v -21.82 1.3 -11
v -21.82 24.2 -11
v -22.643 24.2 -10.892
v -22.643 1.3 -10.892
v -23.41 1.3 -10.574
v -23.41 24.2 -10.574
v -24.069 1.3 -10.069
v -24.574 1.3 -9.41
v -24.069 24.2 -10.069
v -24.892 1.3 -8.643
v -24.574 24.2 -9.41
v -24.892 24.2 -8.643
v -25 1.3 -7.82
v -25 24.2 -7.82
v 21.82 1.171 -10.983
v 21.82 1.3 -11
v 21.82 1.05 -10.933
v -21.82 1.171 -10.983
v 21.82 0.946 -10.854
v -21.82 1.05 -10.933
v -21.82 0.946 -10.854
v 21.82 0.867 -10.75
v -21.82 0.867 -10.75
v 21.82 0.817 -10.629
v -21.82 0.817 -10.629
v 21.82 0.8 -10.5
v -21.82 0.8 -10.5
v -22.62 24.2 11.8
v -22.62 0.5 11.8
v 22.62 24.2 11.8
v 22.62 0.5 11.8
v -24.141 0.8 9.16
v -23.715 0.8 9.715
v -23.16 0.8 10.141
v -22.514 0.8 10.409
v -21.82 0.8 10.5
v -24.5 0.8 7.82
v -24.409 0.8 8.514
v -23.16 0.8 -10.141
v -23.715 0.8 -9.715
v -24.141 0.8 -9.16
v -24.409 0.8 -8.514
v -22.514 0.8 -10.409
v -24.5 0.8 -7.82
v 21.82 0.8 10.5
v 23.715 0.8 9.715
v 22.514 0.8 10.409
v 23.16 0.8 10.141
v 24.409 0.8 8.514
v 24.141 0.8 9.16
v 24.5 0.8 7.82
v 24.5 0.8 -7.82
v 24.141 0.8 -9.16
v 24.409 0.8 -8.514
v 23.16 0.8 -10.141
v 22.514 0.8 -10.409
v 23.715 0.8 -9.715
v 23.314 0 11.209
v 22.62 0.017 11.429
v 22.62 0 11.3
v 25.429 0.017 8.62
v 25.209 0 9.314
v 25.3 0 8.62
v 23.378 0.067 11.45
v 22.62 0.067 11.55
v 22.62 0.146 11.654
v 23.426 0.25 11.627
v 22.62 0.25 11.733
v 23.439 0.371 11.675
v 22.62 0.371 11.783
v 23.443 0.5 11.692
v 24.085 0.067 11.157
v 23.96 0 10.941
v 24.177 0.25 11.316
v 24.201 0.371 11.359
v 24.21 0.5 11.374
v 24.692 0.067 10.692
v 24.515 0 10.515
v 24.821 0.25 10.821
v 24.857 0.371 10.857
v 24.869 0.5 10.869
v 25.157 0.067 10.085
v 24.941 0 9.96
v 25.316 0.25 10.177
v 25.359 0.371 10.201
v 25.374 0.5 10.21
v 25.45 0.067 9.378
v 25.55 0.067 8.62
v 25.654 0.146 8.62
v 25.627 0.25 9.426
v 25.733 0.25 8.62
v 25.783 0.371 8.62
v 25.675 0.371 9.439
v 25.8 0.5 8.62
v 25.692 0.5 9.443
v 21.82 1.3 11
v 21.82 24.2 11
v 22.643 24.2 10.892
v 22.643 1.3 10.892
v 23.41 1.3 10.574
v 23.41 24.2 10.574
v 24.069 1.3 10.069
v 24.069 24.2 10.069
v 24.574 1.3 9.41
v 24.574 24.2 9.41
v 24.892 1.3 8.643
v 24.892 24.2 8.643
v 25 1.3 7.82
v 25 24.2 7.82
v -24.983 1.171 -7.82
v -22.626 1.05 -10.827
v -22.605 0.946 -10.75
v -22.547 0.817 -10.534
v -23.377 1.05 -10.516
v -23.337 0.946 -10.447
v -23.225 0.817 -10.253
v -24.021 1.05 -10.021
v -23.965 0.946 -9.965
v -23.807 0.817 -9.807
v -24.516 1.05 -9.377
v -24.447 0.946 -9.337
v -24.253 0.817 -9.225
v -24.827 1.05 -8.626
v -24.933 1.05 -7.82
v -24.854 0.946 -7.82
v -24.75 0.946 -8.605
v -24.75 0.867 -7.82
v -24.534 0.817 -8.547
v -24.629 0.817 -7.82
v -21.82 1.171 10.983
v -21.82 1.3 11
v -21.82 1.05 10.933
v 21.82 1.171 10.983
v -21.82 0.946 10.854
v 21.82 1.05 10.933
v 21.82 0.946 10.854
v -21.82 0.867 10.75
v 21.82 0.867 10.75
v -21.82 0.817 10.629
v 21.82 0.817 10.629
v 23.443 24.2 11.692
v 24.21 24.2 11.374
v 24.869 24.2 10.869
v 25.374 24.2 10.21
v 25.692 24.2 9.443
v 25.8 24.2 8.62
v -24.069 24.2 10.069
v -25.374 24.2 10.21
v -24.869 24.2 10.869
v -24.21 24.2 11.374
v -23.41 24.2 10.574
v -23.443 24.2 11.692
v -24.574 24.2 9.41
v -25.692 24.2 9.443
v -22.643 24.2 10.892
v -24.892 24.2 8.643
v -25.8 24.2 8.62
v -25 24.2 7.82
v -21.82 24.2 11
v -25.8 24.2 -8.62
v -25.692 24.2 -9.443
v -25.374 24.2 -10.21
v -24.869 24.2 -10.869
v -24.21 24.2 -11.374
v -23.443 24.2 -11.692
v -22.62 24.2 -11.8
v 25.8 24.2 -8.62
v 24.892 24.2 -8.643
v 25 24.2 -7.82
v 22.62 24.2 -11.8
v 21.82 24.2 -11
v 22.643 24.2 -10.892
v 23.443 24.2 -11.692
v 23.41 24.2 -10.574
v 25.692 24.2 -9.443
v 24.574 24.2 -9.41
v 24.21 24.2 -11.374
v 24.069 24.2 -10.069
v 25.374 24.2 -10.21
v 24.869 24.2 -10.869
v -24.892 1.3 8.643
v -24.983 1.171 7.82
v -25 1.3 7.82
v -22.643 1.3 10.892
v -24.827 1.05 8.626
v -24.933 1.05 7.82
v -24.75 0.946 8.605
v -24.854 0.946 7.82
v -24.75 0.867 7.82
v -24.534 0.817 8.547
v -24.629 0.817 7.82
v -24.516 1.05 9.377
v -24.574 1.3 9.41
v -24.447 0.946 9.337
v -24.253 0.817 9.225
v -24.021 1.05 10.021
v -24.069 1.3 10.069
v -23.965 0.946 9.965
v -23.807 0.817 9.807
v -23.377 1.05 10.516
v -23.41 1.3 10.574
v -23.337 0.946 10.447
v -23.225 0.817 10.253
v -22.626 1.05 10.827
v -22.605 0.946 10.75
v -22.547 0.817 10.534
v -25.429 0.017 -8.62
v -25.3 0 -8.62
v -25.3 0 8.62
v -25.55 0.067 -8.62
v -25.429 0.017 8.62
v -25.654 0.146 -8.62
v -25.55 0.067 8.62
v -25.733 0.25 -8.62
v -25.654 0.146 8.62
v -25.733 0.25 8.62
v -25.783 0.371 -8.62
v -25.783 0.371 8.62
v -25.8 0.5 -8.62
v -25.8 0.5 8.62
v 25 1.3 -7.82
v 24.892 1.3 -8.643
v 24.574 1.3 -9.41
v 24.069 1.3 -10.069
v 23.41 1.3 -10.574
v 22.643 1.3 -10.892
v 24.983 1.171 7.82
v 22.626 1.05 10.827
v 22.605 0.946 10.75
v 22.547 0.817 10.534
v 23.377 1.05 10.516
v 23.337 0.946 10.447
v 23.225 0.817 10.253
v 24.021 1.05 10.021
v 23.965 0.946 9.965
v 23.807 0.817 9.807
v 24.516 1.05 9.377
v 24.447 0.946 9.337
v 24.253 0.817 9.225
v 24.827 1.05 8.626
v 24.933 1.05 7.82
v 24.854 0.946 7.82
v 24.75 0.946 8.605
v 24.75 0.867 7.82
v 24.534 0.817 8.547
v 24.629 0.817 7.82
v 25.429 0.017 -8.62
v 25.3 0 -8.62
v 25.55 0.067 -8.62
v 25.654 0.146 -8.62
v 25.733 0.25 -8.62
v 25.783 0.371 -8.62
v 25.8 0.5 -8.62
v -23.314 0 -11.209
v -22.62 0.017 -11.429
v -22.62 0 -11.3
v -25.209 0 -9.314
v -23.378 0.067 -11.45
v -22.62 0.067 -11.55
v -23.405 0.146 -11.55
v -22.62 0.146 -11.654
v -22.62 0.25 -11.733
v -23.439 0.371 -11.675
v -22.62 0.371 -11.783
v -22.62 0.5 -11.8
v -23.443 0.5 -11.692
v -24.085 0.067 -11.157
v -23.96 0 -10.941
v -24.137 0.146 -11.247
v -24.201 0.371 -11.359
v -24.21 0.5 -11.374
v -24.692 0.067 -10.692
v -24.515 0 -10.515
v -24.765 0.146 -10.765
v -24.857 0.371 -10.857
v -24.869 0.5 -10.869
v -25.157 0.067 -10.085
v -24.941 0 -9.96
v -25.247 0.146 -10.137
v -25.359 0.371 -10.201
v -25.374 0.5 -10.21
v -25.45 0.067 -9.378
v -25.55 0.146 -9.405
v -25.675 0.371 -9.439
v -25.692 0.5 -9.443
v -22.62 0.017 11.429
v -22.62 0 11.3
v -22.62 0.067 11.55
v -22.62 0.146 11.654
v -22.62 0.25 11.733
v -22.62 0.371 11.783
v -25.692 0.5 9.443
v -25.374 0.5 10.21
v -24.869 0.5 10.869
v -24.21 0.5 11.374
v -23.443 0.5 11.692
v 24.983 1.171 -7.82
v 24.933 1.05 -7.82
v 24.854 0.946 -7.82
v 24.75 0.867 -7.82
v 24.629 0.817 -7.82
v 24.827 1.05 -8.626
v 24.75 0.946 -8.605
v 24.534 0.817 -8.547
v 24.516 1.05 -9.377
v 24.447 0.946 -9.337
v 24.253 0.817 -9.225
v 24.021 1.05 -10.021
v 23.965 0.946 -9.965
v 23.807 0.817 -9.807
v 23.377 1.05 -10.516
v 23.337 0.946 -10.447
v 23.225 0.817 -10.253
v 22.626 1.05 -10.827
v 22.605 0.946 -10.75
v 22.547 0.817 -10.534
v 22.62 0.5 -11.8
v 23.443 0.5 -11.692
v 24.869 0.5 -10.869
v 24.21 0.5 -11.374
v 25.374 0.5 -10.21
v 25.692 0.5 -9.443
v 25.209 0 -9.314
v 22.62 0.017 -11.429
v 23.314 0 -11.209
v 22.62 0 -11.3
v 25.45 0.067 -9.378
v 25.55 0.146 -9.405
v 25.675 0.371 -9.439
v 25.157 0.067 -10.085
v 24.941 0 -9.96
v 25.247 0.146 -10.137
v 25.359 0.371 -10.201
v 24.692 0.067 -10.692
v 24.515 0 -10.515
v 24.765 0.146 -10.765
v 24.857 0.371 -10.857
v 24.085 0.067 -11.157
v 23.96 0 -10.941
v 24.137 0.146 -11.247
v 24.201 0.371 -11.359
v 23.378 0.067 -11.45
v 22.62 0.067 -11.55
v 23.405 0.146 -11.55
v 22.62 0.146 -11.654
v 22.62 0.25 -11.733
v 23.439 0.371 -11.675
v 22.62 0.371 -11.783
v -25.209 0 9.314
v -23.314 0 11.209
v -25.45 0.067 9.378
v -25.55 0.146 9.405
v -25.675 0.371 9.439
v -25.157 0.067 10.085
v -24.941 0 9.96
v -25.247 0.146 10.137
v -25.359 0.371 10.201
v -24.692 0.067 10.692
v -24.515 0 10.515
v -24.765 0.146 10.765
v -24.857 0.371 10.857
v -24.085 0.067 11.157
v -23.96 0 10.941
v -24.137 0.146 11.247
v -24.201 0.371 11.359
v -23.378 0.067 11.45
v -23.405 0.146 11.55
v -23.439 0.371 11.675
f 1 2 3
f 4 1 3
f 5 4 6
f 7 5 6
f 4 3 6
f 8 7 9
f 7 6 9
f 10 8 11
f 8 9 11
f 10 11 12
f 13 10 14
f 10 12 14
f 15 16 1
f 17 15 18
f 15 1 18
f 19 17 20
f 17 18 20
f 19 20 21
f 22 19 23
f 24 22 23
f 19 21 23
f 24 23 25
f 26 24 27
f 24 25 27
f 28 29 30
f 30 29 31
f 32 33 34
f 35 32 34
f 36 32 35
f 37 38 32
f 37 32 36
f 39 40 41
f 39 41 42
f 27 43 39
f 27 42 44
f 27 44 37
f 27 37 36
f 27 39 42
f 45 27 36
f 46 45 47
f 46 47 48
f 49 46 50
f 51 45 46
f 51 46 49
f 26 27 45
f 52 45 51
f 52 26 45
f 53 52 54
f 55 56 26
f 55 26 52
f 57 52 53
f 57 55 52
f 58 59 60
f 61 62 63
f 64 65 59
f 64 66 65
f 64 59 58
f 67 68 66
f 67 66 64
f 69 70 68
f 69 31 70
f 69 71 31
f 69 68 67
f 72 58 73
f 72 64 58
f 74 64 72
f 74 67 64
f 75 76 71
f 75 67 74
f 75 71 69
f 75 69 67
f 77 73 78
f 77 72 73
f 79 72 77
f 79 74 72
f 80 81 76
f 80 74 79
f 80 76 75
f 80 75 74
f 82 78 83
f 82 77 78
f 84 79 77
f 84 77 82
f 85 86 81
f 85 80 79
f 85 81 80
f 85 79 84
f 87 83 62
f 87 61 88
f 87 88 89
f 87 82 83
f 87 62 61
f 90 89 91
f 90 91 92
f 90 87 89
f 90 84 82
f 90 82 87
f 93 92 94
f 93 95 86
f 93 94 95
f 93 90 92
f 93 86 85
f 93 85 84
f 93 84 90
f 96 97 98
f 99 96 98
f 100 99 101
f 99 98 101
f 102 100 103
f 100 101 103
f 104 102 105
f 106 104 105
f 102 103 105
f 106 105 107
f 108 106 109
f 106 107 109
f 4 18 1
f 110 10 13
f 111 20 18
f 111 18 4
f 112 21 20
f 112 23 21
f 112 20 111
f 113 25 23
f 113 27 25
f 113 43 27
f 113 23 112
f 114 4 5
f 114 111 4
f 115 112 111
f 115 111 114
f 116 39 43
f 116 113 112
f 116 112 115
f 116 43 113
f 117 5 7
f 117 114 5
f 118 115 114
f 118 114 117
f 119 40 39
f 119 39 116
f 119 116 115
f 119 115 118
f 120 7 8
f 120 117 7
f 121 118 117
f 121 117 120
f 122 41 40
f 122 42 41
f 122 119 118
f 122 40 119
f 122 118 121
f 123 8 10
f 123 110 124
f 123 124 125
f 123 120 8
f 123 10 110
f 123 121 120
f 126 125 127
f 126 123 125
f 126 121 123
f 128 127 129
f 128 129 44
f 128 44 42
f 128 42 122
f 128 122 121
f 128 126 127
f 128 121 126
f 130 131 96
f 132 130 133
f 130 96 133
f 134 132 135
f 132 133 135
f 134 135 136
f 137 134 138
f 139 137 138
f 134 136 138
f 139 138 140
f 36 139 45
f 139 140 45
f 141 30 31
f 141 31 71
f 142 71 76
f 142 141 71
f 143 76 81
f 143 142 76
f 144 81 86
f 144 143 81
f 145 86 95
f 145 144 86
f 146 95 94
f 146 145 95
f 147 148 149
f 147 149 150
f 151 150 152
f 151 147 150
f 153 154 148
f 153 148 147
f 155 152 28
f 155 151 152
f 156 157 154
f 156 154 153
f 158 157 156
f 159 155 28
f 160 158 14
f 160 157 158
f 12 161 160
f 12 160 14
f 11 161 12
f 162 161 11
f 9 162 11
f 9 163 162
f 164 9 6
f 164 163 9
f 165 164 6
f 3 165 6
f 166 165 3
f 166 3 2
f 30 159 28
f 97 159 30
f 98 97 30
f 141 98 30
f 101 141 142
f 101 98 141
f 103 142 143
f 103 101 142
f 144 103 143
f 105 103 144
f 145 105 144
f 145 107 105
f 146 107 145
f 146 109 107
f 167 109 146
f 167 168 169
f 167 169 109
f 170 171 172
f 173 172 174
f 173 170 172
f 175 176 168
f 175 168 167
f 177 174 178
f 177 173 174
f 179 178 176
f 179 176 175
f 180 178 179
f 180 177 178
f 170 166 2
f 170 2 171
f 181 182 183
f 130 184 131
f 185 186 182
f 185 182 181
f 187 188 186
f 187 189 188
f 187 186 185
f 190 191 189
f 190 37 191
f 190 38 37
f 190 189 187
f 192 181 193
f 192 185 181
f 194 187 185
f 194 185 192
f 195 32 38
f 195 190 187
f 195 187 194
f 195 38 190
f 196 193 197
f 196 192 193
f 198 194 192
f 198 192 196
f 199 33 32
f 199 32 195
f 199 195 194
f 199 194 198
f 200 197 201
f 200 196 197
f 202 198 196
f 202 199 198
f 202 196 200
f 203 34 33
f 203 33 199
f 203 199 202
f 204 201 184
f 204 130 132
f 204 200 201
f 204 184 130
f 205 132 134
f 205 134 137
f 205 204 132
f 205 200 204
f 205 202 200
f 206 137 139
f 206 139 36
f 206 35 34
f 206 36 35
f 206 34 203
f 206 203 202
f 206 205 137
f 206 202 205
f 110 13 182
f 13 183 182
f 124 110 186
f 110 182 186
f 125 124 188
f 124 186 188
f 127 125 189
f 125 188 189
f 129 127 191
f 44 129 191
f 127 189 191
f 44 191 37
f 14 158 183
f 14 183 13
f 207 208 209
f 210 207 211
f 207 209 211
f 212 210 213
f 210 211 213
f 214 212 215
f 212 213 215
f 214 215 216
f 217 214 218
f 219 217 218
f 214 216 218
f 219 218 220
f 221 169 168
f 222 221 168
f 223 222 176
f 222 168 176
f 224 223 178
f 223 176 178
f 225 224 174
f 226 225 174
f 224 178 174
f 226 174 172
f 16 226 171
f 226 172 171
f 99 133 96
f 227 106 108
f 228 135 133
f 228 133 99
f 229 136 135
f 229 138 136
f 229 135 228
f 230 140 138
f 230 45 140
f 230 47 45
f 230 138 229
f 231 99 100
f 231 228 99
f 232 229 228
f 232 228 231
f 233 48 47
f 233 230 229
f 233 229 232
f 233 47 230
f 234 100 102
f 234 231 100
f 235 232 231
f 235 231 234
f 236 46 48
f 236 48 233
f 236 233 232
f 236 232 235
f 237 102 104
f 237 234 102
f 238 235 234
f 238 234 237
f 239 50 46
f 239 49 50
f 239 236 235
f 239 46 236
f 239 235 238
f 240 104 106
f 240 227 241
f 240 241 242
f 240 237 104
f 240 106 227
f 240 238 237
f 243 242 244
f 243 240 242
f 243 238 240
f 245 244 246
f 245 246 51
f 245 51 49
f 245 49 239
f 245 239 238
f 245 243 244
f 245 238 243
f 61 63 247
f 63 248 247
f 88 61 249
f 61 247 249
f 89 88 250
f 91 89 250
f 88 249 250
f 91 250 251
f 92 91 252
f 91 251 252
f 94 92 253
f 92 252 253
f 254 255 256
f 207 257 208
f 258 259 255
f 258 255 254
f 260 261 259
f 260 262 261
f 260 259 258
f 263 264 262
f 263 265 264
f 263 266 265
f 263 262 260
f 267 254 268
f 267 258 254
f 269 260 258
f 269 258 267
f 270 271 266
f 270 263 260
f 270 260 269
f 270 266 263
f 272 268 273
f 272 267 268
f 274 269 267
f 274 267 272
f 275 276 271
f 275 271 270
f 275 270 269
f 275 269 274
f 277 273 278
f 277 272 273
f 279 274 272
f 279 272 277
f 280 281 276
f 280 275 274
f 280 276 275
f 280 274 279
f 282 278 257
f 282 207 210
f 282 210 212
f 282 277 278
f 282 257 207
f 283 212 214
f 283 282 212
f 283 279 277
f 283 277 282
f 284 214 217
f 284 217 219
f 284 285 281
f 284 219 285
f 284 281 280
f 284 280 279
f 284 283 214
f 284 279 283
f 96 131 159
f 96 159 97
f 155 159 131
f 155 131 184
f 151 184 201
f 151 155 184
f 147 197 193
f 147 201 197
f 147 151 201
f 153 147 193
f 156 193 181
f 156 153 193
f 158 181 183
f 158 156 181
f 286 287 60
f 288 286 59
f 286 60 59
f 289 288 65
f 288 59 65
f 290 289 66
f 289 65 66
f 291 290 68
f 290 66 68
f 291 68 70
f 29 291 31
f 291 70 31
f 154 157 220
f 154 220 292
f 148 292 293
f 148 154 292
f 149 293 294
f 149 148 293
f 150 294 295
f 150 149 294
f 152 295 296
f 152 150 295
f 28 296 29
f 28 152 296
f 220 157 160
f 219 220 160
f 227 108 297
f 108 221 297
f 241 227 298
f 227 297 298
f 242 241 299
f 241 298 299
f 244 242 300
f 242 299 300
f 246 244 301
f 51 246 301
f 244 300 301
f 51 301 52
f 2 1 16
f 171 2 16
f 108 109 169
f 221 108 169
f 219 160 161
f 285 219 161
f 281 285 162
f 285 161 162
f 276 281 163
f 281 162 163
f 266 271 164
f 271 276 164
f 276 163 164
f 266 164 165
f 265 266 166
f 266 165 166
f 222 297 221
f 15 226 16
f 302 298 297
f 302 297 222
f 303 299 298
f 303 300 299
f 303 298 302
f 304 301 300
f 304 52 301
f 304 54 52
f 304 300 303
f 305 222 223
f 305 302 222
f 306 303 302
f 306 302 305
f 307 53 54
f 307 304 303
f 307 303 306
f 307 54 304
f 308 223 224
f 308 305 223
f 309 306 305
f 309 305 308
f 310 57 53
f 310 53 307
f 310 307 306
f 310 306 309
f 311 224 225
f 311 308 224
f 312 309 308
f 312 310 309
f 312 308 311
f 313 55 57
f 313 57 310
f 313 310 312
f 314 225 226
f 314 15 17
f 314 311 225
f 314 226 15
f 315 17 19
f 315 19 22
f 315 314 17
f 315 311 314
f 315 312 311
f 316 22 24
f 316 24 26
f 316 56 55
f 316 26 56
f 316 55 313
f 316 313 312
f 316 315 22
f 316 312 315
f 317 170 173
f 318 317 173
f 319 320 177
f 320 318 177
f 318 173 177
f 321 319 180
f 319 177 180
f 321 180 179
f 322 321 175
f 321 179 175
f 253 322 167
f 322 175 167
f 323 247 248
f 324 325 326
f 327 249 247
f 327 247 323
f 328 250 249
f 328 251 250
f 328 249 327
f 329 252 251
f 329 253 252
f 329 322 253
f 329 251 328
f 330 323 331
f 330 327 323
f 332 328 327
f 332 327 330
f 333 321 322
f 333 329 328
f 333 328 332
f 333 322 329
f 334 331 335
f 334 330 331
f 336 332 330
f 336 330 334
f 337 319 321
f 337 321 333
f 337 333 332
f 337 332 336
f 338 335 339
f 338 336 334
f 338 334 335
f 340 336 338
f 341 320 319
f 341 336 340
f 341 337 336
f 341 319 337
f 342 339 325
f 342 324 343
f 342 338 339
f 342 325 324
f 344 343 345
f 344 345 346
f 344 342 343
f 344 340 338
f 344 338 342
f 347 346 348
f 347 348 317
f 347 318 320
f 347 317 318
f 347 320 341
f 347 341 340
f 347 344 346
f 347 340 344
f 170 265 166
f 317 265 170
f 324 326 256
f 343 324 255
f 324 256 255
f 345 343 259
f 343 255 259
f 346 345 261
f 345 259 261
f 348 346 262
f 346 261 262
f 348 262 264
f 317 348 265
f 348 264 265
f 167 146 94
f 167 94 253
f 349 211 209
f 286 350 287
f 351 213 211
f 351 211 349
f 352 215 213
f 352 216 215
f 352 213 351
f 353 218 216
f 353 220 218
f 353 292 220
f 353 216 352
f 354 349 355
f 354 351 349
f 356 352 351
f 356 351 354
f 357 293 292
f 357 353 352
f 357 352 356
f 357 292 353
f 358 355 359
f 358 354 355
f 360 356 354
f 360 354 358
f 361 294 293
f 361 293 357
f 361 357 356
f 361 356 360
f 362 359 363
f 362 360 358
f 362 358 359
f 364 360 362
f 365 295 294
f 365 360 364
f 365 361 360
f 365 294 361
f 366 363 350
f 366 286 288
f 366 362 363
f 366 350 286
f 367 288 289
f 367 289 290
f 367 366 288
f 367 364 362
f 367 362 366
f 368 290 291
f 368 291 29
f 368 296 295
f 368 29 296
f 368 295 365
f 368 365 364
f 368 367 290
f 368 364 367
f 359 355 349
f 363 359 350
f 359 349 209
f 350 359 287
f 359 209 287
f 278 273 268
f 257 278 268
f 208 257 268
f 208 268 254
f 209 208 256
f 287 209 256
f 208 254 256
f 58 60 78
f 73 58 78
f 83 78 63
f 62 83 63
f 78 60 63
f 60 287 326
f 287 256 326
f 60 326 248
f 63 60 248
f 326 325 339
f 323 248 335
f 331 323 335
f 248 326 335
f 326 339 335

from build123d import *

# Parameters (mm, degrees)
SKETCH4_W           = 51.6
SKETCH4_H           = 23.6
SKETCH4_W_2         = 50
SKETCH4_H_2         = 22
BOSS_EXTRUDE2_DEPTH = 24.2
SKETCH4_2_W         = 50
SKETCH4_2_H         = 22
BOSS_EXTRUDE3_DEPTH = 0.8
FILLET3_R           = 3.18
FILLET4_R           = 0.5


with BuildPart() as part:
    # Sketch4 → Boss-Extrude2 (new body)
    with BuildSketch(Plane(origin=(0, 0, 0), x_dir=(1, 0, 0), z_dir=(0, 1, 0))):
        Rectangle(SKETCH4_W, SKETCH4_H)
        Rectangle(SKETCH4_W_2, SKETCH4_H_2, mode=Mode.SUBTRACT)
    extrude(amount=BOSS_EXTRUDE2_DEPTH)

    # Sketch4<2> → Boss-Extrude3 (add)
    with BuildSketch(Plane(origin=(0, 0, 0), x_dir=(1, 0, 0), z_dir=(0, 1, 0))):
        Rectangle(SKETCH4_2_W, SKETCH4_2_H)
    extrude(amount=BOSS_EXTRUDE3_DEPTH)

    # Fillet3
    fillet3_edges = [part.edges().sort_by_distance(p)[0] for p in [
        (-25, 12.5, -11),
        (-25, 12.5, 11),
        (25, 12.5, 11),
        (25, 12.5, -11),
        (25.8, 12.1, 11.8),
        (-25.8, 12.1, 11.8),
        (-25.8, 12.1, -11.8),
        (25.8, 12.1, -11.8),
    ]]
    fillet(fillet3_edges, radius=FILLET3_R)

    # Fillet4
    fillet4_edges = [part.edges().sort_by_distance(p)[0] for p in [
        (25.8, 0, 0),
        (0, 0, 11.8),
        (-25.8, 0, 0),
        (0, 0, -11.8),
        (-24.868599564, 0, -10.868599564),
        (-24.868599564, 0, 10.868599564),
        (24.868599564, 0, -10.868599564),
        (24.868599564, 0, 10.868599564),
        (25, 0.8, 0),
        (0, 0.8, -11),
        (-25, 0.8, 0),
        (0, 0.8, 11),
        (24.068599564, 0.8, 10.068599564),
        (-24.068599564, 0.8, -10.068599564),
        (-24.068599564, 0.8, 10.068599564),
        (24.068599564, 0.8, -10.068599564),
    ]]
    fillet(fillet4_edges, radius=FILLET4_R)


solid = part.part
